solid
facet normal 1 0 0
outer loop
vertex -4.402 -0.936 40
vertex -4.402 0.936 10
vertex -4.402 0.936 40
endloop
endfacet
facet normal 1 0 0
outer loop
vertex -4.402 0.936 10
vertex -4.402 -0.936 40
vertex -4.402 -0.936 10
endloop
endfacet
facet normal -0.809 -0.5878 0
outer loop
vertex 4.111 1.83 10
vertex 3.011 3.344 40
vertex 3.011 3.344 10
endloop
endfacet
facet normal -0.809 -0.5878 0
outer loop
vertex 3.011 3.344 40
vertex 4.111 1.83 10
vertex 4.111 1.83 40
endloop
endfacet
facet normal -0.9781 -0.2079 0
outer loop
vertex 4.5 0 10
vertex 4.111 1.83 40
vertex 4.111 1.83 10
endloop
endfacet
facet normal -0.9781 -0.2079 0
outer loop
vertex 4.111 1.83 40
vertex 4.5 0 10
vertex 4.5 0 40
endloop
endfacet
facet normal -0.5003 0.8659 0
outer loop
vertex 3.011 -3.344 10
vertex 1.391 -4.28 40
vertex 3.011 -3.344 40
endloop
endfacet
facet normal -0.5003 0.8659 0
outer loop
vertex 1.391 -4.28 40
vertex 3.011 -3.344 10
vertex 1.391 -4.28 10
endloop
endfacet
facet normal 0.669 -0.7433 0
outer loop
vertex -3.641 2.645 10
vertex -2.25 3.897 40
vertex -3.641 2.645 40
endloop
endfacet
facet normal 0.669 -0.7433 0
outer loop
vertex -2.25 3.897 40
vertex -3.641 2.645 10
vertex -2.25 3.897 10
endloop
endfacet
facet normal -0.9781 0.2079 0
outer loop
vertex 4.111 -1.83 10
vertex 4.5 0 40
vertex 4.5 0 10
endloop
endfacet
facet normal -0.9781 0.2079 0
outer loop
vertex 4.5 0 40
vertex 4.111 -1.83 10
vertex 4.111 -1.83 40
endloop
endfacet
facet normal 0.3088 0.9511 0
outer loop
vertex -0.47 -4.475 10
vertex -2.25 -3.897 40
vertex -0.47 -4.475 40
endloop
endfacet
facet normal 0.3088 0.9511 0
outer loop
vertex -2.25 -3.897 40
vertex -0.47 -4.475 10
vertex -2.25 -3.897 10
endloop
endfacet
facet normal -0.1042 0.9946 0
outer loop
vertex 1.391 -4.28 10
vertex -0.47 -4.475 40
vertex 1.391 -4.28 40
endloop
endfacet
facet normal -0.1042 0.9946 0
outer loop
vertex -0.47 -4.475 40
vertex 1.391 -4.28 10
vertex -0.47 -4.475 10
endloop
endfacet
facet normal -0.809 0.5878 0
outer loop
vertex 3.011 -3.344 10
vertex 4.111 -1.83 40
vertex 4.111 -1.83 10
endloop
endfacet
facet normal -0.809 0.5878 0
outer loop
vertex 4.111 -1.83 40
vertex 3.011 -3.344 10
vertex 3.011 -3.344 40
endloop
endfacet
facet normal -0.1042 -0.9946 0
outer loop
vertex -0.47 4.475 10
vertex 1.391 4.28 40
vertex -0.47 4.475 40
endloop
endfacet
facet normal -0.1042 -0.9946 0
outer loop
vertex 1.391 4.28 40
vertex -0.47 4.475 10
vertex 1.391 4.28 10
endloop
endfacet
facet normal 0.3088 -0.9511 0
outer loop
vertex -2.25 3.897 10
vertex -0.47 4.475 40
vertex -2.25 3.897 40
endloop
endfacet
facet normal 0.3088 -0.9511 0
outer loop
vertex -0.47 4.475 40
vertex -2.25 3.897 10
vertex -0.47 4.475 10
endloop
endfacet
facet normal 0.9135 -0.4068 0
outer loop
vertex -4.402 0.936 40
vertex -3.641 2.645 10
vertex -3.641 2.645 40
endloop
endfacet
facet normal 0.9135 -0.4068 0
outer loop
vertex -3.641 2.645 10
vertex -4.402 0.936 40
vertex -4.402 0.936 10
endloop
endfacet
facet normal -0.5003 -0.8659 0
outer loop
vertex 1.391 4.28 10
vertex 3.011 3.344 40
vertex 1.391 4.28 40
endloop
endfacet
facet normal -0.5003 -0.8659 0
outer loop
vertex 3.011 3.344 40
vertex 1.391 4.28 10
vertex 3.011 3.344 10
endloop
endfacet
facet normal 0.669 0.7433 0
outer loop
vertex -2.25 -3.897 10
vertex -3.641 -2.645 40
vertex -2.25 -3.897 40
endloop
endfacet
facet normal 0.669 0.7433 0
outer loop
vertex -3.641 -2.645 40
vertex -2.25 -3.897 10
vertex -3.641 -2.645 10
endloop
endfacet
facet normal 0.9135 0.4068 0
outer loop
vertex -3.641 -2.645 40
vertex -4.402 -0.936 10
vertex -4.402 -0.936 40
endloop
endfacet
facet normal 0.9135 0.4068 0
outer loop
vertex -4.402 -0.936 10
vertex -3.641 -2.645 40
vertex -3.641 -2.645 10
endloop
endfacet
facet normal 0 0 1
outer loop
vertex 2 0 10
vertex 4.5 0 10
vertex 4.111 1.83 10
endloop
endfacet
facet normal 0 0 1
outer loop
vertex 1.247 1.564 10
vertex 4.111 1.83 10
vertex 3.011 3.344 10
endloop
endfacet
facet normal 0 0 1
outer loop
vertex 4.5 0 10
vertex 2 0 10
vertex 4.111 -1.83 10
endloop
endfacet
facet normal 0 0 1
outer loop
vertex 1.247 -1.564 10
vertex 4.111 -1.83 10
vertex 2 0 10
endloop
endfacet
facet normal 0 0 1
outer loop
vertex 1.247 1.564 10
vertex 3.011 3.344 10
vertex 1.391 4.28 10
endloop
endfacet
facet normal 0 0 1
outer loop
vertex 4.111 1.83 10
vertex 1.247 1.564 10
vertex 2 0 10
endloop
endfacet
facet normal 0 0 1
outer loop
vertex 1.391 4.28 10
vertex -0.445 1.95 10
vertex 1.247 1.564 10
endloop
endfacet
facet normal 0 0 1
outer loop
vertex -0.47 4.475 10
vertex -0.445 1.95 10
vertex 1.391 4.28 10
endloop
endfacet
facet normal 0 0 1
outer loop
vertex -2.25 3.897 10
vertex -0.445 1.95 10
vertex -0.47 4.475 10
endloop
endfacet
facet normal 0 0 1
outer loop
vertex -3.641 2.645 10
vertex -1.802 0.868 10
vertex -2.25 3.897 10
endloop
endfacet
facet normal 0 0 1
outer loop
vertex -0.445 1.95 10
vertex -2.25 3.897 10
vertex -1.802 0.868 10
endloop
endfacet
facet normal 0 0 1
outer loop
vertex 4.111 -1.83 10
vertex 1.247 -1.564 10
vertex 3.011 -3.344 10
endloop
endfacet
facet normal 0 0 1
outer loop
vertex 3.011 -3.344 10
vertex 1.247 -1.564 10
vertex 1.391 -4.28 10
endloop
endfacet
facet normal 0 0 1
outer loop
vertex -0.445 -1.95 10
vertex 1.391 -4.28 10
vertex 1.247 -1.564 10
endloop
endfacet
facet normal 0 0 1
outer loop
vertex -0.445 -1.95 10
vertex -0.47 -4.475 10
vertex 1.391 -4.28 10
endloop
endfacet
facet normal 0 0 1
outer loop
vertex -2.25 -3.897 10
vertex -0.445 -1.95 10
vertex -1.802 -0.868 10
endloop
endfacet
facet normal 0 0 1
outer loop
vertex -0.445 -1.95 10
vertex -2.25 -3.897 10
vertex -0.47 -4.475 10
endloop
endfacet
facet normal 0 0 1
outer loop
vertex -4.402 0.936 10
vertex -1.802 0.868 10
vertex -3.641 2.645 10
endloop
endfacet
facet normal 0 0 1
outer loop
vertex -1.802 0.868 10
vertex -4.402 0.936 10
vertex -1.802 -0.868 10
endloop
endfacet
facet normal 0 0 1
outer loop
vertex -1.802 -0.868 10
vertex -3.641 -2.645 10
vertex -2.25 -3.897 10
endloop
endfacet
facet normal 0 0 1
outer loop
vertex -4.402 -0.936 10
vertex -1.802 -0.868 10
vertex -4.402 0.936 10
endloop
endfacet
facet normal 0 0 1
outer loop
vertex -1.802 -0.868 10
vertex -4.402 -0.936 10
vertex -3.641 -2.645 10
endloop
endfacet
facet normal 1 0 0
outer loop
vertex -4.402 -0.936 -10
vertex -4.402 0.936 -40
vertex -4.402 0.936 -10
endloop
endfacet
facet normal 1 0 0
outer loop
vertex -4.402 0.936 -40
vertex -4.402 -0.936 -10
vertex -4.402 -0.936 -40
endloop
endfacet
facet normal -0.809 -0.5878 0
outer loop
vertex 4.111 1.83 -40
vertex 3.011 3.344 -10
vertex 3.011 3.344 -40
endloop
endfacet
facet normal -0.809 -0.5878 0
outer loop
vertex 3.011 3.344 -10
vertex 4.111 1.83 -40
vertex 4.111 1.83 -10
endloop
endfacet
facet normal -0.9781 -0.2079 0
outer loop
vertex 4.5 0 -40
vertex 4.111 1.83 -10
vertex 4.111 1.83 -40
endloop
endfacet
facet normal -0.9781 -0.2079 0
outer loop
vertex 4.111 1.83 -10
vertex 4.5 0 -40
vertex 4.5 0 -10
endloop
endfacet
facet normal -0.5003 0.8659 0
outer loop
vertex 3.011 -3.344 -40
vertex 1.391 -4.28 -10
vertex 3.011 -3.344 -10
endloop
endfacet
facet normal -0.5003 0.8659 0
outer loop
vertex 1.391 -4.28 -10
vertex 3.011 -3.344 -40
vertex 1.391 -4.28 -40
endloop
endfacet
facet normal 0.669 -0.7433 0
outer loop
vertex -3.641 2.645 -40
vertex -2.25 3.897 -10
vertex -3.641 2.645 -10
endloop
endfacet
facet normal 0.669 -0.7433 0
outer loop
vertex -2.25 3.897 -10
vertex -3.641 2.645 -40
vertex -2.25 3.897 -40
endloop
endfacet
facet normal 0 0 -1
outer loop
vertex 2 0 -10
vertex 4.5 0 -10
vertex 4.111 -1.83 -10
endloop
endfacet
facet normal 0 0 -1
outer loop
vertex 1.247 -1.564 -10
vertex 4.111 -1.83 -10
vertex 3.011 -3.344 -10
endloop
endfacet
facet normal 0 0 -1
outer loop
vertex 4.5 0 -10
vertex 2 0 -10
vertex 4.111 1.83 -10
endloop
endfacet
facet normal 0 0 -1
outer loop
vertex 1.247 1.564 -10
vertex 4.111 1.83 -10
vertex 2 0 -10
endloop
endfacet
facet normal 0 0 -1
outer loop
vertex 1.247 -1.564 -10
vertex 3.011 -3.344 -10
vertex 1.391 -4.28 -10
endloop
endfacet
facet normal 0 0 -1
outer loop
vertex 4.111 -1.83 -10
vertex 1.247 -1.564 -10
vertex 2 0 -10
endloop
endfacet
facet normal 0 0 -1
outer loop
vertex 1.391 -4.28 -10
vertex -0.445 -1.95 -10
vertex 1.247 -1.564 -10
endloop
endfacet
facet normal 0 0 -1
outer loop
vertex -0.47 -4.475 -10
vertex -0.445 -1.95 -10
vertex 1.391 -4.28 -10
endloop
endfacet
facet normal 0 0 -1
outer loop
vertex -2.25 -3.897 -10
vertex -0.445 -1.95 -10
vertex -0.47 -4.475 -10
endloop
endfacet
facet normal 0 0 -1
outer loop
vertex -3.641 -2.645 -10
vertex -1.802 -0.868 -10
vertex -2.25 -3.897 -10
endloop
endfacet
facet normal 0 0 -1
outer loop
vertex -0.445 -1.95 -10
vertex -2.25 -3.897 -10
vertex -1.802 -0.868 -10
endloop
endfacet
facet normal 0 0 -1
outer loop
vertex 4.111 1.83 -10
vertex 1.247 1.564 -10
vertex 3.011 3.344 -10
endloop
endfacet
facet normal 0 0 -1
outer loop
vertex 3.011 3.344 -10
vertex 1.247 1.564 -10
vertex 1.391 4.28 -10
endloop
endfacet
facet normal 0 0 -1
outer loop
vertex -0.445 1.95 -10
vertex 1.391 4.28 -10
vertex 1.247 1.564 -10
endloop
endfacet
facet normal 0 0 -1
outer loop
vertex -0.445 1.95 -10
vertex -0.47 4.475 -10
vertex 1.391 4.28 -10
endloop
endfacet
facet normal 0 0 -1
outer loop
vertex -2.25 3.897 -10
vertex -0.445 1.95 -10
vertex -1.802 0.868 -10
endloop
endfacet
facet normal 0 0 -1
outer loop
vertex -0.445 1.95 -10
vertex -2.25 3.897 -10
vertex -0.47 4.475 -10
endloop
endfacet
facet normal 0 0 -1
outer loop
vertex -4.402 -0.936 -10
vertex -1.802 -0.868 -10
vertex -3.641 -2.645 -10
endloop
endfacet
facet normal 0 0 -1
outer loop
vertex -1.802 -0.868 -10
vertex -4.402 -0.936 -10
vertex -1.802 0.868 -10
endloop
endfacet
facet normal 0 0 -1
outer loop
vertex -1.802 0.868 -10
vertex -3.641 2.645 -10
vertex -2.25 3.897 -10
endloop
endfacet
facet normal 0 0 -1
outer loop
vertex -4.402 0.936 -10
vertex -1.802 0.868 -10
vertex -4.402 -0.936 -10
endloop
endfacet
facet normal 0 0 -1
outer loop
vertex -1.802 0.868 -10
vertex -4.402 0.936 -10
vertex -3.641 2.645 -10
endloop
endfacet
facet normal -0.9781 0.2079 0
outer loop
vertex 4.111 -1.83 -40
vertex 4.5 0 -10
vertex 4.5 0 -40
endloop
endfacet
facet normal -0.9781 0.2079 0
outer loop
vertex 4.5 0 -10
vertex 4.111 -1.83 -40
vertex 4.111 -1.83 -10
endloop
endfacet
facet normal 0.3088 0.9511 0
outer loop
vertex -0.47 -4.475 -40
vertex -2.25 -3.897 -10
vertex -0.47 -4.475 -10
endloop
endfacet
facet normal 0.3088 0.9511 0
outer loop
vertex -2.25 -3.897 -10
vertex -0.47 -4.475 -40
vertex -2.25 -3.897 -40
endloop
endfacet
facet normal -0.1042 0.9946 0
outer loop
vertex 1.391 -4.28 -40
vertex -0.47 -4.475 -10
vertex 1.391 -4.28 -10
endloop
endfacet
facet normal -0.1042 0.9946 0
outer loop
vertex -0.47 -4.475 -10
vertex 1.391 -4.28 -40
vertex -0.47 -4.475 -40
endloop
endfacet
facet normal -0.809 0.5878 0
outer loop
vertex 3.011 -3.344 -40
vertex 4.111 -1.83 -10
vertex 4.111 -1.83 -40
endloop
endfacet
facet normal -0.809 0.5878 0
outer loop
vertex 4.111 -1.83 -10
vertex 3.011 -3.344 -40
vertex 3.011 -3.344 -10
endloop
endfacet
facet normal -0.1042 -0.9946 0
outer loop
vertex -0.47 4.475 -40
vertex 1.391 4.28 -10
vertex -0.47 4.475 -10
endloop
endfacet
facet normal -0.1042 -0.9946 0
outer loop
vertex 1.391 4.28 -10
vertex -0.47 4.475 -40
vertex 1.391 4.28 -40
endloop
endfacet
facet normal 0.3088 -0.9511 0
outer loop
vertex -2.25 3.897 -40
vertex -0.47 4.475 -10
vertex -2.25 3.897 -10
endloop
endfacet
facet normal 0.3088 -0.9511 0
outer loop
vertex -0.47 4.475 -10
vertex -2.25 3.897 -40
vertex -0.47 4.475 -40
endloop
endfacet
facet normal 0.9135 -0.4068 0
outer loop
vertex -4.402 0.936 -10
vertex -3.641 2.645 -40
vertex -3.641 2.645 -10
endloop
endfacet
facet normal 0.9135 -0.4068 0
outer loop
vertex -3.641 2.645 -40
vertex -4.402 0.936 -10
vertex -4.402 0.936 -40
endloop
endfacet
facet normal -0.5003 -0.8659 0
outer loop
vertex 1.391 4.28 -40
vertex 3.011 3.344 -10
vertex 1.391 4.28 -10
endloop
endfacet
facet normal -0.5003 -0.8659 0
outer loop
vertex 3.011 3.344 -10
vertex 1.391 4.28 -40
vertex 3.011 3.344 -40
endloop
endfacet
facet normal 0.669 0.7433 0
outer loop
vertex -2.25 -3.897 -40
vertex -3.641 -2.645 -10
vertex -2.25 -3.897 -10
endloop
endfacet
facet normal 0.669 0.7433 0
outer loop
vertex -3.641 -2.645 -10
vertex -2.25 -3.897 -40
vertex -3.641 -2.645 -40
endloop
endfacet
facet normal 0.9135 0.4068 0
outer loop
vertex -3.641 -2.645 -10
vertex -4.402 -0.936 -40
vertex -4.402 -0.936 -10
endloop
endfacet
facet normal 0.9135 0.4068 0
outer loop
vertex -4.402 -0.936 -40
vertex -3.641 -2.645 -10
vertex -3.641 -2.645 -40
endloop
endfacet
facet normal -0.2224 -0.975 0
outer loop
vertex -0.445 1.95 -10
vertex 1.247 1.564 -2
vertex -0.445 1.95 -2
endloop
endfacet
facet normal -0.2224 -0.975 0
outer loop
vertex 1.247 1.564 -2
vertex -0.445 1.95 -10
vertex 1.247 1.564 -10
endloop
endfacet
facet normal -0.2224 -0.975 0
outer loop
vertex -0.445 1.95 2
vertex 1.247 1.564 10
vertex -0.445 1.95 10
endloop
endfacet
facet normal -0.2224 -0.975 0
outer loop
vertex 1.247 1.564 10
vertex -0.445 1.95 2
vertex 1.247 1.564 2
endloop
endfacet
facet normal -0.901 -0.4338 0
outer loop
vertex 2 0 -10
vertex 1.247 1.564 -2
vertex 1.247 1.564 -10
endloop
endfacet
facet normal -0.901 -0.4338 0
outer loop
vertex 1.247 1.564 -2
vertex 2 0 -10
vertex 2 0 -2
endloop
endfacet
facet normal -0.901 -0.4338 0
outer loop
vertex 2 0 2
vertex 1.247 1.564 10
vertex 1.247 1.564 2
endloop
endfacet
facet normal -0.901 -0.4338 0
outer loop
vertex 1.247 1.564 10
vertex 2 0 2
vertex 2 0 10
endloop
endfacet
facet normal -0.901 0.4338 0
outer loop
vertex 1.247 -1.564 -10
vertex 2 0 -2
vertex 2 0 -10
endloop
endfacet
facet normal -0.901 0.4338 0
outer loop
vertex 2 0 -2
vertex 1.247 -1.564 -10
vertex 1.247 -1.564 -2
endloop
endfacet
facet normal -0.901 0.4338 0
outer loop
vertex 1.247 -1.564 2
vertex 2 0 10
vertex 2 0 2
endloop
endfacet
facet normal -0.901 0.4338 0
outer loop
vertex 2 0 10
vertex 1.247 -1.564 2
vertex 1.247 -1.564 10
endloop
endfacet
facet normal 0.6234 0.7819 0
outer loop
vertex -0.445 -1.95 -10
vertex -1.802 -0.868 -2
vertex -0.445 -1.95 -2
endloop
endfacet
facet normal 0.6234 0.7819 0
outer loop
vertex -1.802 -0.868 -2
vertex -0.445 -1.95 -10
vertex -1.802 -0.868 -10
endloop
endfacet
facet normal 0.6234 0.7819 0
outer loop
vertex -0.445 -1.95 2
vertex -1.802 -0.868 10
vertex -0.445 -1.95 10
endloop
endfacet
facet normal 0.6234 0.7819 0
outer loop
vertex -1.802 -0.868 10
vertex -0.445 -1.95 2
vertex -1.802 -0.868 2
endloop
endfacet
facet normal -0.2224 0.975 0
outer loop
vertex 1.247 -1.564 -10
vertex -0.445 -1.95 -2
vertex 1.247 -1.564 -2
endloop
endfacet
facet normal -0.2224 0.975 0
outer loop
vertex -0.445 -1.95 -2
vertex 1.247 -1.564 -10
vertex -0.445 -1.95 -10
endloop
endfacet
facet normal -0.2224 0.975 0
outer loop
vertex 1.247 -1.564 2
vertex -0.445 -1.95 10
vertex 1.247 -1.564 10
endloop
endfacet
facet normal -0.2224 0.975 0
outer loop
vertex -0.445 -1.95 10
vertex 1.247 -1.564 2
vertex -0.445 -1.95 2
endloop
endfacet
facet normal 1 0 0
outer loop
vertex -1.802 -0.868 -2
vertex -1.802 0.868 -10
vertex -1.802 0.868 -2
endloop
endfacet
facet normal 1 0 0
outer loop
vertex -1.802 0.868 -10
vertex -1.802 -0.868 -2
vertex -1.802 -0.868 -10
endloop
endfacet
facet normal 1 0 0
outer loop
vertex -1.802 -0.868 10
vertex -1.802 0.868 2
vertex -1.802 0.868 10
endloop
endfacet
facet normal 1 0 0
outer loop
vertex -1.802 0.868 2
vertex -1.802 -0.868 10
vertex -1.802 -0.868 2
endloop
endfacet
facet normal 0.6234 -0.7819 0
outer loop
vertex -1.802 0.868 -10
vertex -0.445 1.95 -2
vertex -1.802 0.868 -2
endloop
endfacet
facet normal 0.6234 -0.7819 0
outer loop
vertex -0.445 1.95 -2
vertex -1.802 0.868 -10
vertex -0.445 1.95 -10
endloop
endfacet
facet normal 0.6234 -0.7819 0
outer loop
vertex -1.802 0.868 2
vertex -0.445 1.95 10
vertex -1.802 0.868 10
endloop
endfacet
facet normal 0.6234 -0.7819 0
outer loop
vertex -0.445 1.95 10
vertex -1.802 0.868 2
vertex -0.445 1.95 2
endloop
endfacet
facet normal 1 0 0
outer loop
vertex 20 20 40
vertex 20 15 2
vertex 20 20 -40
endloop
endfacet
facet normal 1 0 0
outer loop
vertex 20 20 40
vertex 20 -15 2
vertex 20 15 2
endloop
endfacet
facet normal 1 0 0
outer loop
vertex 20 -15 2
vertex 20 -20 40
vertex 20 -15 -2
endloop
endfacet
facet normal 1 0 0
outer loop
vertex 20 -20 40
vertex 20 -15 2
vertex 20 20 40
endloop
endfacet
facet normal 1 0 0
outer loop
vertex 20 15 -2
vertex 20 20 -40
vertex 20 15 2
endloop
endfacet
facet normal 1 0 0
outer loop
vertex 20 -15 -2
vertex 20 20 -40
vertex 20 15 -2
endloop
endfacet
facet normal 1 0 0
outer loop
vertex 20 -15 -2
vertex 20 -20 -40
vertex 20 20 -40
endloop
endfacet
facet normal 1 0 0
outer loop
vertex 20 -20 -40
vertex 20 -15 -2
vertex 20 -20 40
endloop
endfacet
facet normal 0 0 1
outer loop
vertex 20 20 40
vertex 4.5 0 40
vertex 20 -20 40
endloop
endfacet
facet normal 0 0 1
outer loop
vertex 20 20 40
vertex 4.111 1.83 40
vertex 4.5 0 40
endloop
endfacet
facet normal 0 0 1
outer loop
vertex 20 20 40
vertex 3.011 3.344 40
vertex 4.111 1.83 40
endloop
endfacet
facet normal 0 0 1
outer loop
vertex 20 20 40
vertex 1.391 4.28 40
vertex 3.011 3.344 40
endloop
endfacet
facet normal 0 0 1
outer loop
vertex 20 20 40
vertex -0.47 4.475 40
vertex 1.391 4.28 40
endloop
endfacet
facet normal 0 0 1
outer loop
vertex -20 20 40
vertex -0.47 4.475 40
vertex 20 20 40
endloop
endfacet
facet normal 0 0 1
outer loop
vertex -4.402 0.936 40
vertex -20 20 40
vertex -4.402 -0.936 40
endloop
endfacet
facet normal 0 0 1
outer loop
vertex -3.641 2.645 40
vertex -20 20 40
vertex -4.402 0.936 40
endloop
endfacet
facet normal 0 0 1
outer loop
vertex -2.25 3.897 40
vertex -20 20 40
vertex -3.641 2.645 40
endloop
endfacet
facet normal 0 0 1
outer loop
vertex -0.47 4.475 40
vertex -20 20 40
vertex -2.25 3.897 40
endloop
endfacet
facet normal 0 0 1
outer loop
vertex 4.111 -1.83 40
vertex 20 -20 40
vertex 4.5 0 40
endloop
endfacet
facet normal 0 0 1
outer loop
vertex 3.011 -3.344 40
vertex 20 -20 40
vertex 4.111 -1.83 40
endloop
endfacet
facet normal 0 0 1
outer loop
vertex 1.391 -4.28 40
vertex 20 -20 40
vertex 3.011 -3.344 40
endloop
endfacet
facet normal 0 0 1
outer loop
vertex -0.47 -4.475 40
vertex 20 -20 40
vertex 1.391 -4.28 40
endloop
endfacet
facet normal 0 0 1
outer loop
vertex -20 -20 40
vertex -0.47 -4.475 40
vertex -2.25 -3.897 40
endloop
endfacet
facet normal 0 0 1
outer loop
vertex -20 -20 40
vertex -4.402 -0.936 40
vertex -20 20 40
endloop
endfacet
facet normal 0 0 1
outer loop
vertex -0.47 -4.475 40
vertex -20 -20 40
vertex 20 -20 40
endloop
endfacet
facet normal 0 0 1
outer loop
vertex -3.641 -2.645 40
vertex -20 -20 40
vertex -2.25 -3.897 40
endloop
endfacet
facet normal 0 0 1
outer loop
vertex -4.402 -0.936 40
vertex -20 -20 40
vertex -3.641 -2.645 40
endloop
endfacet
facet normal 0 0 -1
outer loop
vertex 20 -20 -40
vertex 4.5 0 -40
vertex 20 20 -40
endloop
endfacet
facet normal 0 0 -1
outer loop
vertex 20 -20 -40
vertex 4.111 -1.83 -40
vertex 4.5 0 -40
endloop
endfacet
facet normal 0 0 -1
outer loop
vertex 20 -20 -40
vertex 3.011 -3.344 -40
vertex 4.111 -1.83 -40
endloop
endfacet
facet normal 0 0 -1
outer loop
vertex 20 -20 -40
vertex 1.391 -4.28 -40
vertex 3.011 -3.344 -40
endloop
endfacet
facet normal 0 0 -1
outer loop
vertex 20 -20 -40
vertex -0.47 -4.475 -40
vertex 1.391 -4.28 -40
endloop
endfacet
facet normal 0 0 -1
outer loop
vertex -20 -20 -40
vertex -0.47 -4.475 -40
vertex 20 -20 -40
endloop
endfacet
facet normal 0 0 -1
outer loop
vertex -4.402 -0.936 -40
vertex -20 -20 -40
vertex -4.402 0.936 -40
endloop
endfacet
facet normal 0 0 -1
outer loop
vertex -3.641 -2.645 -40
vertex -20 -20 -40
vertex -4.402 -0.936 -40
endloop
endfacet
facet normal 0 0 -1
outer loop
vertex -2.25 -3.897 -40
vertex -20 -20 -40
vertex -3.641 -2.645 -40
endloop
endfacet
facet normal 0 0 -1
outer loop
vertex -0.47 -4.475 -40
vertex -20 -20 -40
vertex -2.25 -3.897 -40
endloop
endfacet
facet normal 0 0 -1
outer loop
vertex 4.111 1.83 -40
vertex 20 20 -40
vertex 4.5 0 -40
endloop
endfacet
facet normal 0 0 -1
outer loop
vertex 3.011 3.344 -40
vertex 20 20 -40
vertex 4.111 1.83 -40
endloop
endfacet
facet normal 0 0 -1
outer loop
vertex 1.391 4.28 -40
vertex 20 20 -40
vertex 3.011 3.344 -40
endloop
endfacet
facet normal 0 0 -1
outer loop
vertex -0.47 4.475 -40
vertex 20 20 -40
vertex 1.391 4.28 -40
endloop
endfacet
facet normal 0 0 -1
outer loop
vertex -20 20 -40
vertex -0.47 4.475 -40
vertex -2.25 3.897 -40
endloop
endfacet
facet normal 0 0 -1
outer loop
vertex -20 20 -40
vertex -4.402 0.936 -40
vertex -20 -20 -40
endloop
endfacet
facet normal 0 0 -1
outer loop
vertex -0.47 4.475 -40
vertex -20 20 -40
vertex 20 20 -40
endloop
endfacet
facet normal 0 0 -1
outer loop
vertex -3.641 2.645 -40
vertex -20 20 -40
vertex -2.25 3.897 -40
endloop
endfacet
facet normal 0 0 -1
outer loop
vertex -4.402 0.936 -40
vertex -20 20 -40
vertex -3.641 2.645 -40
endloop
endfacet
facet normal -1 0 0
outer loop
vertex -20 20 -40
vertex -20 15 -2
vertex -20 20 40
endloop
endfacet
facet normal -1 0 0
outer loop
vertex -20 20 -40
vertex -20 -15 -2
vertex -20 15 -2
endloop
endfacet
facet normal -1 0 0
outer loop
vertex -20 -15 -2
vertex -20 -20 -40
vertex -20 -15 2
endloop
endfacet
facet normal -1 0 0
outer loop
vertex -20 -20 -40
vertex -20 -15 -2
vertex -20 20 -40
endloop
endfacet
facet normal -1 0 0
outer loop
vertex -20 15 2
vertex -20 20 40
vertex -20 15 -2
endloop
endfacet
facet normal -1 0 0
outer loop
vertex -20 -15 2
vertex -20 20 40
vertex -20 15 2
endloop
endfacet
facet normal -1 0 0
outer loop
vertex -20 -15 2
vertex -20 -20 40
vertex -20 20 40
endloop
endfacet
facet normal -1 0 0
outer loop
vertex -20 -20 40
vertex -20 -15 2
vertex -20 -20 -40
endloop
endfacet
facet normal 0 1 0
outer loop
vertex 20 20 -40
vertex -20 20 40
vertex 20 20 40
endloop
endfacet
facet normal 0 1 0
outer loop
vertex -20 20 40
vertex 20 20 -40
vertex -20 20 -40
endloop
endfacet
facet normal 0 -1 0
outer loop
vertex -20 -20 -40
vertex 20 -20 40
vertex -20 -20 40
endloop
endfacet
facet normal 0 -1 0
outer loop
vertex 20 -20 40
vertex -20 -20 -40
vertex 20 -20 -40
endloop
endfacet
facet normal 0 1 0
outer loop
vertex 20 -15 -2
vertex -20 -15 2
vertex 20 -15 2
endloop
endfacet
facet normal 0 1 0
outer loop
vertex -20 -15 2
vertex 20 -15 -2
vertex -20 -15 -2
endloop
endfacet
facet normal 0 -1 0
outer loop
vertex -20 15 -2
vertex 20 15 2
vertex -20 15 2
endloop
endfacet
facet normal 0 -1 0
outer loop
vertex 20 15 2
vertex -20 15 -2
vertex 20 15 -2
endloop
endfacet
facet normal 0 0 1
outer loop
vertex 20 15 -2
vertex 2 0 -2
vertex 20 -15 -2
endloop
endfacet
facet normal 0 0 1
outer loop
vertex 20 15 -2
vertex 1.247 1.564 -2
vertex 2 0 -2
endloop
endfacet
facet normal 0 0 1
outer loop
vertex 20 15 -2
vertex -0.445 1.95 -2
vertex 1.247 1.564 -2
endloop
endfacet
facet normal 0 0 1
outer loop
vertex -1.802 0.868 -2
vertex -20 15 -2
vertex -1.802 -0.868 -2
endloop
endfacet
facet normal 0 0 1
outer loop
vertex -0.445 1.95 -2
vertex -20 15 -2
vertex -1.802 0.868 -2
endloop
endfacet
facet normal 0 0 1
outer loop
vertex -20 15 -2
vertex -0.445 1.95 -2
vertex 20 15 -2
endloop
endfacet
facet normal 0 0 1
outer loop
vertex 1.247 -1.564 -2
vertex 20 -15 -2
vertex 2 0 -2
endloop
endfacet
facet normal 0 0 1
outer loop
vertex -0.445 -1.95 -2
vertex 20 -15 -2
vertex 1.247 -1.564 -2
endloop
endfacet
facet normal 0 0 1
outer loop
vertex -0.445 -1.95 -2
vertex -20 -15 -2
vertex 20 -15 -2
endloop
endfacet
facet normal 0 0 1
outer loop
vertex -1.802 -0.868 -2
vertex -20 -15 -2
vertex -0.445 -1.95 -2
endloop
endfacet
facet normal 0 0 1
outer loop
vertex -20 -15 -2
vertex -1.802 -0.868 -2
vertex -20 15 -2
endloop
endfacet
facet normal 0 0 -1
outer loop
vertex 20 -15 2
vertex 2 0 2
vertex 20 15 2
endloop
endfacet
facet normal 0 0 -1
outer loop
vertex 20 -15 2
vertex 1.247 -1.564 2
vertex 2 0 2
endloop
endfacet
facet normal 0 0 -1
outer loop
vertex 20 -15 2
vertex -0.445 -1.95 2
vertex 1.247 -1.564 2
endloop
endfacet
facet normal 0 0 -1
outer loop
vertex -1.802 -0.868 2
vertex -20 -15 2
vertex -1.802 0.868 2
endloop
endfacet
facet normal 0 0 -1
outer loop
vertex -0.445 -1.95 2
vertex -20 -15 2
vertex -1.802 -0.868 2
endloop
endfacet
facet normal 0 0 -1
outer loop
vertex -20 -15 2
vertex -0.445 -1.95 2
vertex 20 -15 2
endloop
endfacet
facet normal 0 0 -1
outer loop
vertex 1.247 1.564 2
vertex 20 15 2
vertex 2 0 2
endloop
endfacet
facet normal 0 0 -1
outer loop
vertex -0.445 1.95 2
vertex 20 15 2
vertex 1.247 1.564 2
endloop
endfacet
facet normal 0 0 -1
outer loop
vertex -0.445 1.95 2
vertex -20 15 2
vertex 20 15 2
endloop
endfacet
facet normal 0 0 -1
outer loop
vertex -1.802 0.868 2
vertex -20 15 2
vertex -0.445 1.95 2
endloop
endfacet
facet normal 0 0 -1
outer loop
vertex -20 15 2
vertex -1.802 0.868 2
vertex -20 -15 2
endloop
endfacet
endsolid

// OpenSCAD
difference(){
	cube([40,40,80], center=true); 
rotate([90,0,0]){
cube([75,4,30],center=true);
}
union () {
translate([0,0,10]){
cylinder(60,4.5,4.5);
}
	translate([0,0,-50]){
		cylinder(40,4.5,4.5);
}
translate([0,0,-40]){
cylinder(80,2,2);
}
}
}
